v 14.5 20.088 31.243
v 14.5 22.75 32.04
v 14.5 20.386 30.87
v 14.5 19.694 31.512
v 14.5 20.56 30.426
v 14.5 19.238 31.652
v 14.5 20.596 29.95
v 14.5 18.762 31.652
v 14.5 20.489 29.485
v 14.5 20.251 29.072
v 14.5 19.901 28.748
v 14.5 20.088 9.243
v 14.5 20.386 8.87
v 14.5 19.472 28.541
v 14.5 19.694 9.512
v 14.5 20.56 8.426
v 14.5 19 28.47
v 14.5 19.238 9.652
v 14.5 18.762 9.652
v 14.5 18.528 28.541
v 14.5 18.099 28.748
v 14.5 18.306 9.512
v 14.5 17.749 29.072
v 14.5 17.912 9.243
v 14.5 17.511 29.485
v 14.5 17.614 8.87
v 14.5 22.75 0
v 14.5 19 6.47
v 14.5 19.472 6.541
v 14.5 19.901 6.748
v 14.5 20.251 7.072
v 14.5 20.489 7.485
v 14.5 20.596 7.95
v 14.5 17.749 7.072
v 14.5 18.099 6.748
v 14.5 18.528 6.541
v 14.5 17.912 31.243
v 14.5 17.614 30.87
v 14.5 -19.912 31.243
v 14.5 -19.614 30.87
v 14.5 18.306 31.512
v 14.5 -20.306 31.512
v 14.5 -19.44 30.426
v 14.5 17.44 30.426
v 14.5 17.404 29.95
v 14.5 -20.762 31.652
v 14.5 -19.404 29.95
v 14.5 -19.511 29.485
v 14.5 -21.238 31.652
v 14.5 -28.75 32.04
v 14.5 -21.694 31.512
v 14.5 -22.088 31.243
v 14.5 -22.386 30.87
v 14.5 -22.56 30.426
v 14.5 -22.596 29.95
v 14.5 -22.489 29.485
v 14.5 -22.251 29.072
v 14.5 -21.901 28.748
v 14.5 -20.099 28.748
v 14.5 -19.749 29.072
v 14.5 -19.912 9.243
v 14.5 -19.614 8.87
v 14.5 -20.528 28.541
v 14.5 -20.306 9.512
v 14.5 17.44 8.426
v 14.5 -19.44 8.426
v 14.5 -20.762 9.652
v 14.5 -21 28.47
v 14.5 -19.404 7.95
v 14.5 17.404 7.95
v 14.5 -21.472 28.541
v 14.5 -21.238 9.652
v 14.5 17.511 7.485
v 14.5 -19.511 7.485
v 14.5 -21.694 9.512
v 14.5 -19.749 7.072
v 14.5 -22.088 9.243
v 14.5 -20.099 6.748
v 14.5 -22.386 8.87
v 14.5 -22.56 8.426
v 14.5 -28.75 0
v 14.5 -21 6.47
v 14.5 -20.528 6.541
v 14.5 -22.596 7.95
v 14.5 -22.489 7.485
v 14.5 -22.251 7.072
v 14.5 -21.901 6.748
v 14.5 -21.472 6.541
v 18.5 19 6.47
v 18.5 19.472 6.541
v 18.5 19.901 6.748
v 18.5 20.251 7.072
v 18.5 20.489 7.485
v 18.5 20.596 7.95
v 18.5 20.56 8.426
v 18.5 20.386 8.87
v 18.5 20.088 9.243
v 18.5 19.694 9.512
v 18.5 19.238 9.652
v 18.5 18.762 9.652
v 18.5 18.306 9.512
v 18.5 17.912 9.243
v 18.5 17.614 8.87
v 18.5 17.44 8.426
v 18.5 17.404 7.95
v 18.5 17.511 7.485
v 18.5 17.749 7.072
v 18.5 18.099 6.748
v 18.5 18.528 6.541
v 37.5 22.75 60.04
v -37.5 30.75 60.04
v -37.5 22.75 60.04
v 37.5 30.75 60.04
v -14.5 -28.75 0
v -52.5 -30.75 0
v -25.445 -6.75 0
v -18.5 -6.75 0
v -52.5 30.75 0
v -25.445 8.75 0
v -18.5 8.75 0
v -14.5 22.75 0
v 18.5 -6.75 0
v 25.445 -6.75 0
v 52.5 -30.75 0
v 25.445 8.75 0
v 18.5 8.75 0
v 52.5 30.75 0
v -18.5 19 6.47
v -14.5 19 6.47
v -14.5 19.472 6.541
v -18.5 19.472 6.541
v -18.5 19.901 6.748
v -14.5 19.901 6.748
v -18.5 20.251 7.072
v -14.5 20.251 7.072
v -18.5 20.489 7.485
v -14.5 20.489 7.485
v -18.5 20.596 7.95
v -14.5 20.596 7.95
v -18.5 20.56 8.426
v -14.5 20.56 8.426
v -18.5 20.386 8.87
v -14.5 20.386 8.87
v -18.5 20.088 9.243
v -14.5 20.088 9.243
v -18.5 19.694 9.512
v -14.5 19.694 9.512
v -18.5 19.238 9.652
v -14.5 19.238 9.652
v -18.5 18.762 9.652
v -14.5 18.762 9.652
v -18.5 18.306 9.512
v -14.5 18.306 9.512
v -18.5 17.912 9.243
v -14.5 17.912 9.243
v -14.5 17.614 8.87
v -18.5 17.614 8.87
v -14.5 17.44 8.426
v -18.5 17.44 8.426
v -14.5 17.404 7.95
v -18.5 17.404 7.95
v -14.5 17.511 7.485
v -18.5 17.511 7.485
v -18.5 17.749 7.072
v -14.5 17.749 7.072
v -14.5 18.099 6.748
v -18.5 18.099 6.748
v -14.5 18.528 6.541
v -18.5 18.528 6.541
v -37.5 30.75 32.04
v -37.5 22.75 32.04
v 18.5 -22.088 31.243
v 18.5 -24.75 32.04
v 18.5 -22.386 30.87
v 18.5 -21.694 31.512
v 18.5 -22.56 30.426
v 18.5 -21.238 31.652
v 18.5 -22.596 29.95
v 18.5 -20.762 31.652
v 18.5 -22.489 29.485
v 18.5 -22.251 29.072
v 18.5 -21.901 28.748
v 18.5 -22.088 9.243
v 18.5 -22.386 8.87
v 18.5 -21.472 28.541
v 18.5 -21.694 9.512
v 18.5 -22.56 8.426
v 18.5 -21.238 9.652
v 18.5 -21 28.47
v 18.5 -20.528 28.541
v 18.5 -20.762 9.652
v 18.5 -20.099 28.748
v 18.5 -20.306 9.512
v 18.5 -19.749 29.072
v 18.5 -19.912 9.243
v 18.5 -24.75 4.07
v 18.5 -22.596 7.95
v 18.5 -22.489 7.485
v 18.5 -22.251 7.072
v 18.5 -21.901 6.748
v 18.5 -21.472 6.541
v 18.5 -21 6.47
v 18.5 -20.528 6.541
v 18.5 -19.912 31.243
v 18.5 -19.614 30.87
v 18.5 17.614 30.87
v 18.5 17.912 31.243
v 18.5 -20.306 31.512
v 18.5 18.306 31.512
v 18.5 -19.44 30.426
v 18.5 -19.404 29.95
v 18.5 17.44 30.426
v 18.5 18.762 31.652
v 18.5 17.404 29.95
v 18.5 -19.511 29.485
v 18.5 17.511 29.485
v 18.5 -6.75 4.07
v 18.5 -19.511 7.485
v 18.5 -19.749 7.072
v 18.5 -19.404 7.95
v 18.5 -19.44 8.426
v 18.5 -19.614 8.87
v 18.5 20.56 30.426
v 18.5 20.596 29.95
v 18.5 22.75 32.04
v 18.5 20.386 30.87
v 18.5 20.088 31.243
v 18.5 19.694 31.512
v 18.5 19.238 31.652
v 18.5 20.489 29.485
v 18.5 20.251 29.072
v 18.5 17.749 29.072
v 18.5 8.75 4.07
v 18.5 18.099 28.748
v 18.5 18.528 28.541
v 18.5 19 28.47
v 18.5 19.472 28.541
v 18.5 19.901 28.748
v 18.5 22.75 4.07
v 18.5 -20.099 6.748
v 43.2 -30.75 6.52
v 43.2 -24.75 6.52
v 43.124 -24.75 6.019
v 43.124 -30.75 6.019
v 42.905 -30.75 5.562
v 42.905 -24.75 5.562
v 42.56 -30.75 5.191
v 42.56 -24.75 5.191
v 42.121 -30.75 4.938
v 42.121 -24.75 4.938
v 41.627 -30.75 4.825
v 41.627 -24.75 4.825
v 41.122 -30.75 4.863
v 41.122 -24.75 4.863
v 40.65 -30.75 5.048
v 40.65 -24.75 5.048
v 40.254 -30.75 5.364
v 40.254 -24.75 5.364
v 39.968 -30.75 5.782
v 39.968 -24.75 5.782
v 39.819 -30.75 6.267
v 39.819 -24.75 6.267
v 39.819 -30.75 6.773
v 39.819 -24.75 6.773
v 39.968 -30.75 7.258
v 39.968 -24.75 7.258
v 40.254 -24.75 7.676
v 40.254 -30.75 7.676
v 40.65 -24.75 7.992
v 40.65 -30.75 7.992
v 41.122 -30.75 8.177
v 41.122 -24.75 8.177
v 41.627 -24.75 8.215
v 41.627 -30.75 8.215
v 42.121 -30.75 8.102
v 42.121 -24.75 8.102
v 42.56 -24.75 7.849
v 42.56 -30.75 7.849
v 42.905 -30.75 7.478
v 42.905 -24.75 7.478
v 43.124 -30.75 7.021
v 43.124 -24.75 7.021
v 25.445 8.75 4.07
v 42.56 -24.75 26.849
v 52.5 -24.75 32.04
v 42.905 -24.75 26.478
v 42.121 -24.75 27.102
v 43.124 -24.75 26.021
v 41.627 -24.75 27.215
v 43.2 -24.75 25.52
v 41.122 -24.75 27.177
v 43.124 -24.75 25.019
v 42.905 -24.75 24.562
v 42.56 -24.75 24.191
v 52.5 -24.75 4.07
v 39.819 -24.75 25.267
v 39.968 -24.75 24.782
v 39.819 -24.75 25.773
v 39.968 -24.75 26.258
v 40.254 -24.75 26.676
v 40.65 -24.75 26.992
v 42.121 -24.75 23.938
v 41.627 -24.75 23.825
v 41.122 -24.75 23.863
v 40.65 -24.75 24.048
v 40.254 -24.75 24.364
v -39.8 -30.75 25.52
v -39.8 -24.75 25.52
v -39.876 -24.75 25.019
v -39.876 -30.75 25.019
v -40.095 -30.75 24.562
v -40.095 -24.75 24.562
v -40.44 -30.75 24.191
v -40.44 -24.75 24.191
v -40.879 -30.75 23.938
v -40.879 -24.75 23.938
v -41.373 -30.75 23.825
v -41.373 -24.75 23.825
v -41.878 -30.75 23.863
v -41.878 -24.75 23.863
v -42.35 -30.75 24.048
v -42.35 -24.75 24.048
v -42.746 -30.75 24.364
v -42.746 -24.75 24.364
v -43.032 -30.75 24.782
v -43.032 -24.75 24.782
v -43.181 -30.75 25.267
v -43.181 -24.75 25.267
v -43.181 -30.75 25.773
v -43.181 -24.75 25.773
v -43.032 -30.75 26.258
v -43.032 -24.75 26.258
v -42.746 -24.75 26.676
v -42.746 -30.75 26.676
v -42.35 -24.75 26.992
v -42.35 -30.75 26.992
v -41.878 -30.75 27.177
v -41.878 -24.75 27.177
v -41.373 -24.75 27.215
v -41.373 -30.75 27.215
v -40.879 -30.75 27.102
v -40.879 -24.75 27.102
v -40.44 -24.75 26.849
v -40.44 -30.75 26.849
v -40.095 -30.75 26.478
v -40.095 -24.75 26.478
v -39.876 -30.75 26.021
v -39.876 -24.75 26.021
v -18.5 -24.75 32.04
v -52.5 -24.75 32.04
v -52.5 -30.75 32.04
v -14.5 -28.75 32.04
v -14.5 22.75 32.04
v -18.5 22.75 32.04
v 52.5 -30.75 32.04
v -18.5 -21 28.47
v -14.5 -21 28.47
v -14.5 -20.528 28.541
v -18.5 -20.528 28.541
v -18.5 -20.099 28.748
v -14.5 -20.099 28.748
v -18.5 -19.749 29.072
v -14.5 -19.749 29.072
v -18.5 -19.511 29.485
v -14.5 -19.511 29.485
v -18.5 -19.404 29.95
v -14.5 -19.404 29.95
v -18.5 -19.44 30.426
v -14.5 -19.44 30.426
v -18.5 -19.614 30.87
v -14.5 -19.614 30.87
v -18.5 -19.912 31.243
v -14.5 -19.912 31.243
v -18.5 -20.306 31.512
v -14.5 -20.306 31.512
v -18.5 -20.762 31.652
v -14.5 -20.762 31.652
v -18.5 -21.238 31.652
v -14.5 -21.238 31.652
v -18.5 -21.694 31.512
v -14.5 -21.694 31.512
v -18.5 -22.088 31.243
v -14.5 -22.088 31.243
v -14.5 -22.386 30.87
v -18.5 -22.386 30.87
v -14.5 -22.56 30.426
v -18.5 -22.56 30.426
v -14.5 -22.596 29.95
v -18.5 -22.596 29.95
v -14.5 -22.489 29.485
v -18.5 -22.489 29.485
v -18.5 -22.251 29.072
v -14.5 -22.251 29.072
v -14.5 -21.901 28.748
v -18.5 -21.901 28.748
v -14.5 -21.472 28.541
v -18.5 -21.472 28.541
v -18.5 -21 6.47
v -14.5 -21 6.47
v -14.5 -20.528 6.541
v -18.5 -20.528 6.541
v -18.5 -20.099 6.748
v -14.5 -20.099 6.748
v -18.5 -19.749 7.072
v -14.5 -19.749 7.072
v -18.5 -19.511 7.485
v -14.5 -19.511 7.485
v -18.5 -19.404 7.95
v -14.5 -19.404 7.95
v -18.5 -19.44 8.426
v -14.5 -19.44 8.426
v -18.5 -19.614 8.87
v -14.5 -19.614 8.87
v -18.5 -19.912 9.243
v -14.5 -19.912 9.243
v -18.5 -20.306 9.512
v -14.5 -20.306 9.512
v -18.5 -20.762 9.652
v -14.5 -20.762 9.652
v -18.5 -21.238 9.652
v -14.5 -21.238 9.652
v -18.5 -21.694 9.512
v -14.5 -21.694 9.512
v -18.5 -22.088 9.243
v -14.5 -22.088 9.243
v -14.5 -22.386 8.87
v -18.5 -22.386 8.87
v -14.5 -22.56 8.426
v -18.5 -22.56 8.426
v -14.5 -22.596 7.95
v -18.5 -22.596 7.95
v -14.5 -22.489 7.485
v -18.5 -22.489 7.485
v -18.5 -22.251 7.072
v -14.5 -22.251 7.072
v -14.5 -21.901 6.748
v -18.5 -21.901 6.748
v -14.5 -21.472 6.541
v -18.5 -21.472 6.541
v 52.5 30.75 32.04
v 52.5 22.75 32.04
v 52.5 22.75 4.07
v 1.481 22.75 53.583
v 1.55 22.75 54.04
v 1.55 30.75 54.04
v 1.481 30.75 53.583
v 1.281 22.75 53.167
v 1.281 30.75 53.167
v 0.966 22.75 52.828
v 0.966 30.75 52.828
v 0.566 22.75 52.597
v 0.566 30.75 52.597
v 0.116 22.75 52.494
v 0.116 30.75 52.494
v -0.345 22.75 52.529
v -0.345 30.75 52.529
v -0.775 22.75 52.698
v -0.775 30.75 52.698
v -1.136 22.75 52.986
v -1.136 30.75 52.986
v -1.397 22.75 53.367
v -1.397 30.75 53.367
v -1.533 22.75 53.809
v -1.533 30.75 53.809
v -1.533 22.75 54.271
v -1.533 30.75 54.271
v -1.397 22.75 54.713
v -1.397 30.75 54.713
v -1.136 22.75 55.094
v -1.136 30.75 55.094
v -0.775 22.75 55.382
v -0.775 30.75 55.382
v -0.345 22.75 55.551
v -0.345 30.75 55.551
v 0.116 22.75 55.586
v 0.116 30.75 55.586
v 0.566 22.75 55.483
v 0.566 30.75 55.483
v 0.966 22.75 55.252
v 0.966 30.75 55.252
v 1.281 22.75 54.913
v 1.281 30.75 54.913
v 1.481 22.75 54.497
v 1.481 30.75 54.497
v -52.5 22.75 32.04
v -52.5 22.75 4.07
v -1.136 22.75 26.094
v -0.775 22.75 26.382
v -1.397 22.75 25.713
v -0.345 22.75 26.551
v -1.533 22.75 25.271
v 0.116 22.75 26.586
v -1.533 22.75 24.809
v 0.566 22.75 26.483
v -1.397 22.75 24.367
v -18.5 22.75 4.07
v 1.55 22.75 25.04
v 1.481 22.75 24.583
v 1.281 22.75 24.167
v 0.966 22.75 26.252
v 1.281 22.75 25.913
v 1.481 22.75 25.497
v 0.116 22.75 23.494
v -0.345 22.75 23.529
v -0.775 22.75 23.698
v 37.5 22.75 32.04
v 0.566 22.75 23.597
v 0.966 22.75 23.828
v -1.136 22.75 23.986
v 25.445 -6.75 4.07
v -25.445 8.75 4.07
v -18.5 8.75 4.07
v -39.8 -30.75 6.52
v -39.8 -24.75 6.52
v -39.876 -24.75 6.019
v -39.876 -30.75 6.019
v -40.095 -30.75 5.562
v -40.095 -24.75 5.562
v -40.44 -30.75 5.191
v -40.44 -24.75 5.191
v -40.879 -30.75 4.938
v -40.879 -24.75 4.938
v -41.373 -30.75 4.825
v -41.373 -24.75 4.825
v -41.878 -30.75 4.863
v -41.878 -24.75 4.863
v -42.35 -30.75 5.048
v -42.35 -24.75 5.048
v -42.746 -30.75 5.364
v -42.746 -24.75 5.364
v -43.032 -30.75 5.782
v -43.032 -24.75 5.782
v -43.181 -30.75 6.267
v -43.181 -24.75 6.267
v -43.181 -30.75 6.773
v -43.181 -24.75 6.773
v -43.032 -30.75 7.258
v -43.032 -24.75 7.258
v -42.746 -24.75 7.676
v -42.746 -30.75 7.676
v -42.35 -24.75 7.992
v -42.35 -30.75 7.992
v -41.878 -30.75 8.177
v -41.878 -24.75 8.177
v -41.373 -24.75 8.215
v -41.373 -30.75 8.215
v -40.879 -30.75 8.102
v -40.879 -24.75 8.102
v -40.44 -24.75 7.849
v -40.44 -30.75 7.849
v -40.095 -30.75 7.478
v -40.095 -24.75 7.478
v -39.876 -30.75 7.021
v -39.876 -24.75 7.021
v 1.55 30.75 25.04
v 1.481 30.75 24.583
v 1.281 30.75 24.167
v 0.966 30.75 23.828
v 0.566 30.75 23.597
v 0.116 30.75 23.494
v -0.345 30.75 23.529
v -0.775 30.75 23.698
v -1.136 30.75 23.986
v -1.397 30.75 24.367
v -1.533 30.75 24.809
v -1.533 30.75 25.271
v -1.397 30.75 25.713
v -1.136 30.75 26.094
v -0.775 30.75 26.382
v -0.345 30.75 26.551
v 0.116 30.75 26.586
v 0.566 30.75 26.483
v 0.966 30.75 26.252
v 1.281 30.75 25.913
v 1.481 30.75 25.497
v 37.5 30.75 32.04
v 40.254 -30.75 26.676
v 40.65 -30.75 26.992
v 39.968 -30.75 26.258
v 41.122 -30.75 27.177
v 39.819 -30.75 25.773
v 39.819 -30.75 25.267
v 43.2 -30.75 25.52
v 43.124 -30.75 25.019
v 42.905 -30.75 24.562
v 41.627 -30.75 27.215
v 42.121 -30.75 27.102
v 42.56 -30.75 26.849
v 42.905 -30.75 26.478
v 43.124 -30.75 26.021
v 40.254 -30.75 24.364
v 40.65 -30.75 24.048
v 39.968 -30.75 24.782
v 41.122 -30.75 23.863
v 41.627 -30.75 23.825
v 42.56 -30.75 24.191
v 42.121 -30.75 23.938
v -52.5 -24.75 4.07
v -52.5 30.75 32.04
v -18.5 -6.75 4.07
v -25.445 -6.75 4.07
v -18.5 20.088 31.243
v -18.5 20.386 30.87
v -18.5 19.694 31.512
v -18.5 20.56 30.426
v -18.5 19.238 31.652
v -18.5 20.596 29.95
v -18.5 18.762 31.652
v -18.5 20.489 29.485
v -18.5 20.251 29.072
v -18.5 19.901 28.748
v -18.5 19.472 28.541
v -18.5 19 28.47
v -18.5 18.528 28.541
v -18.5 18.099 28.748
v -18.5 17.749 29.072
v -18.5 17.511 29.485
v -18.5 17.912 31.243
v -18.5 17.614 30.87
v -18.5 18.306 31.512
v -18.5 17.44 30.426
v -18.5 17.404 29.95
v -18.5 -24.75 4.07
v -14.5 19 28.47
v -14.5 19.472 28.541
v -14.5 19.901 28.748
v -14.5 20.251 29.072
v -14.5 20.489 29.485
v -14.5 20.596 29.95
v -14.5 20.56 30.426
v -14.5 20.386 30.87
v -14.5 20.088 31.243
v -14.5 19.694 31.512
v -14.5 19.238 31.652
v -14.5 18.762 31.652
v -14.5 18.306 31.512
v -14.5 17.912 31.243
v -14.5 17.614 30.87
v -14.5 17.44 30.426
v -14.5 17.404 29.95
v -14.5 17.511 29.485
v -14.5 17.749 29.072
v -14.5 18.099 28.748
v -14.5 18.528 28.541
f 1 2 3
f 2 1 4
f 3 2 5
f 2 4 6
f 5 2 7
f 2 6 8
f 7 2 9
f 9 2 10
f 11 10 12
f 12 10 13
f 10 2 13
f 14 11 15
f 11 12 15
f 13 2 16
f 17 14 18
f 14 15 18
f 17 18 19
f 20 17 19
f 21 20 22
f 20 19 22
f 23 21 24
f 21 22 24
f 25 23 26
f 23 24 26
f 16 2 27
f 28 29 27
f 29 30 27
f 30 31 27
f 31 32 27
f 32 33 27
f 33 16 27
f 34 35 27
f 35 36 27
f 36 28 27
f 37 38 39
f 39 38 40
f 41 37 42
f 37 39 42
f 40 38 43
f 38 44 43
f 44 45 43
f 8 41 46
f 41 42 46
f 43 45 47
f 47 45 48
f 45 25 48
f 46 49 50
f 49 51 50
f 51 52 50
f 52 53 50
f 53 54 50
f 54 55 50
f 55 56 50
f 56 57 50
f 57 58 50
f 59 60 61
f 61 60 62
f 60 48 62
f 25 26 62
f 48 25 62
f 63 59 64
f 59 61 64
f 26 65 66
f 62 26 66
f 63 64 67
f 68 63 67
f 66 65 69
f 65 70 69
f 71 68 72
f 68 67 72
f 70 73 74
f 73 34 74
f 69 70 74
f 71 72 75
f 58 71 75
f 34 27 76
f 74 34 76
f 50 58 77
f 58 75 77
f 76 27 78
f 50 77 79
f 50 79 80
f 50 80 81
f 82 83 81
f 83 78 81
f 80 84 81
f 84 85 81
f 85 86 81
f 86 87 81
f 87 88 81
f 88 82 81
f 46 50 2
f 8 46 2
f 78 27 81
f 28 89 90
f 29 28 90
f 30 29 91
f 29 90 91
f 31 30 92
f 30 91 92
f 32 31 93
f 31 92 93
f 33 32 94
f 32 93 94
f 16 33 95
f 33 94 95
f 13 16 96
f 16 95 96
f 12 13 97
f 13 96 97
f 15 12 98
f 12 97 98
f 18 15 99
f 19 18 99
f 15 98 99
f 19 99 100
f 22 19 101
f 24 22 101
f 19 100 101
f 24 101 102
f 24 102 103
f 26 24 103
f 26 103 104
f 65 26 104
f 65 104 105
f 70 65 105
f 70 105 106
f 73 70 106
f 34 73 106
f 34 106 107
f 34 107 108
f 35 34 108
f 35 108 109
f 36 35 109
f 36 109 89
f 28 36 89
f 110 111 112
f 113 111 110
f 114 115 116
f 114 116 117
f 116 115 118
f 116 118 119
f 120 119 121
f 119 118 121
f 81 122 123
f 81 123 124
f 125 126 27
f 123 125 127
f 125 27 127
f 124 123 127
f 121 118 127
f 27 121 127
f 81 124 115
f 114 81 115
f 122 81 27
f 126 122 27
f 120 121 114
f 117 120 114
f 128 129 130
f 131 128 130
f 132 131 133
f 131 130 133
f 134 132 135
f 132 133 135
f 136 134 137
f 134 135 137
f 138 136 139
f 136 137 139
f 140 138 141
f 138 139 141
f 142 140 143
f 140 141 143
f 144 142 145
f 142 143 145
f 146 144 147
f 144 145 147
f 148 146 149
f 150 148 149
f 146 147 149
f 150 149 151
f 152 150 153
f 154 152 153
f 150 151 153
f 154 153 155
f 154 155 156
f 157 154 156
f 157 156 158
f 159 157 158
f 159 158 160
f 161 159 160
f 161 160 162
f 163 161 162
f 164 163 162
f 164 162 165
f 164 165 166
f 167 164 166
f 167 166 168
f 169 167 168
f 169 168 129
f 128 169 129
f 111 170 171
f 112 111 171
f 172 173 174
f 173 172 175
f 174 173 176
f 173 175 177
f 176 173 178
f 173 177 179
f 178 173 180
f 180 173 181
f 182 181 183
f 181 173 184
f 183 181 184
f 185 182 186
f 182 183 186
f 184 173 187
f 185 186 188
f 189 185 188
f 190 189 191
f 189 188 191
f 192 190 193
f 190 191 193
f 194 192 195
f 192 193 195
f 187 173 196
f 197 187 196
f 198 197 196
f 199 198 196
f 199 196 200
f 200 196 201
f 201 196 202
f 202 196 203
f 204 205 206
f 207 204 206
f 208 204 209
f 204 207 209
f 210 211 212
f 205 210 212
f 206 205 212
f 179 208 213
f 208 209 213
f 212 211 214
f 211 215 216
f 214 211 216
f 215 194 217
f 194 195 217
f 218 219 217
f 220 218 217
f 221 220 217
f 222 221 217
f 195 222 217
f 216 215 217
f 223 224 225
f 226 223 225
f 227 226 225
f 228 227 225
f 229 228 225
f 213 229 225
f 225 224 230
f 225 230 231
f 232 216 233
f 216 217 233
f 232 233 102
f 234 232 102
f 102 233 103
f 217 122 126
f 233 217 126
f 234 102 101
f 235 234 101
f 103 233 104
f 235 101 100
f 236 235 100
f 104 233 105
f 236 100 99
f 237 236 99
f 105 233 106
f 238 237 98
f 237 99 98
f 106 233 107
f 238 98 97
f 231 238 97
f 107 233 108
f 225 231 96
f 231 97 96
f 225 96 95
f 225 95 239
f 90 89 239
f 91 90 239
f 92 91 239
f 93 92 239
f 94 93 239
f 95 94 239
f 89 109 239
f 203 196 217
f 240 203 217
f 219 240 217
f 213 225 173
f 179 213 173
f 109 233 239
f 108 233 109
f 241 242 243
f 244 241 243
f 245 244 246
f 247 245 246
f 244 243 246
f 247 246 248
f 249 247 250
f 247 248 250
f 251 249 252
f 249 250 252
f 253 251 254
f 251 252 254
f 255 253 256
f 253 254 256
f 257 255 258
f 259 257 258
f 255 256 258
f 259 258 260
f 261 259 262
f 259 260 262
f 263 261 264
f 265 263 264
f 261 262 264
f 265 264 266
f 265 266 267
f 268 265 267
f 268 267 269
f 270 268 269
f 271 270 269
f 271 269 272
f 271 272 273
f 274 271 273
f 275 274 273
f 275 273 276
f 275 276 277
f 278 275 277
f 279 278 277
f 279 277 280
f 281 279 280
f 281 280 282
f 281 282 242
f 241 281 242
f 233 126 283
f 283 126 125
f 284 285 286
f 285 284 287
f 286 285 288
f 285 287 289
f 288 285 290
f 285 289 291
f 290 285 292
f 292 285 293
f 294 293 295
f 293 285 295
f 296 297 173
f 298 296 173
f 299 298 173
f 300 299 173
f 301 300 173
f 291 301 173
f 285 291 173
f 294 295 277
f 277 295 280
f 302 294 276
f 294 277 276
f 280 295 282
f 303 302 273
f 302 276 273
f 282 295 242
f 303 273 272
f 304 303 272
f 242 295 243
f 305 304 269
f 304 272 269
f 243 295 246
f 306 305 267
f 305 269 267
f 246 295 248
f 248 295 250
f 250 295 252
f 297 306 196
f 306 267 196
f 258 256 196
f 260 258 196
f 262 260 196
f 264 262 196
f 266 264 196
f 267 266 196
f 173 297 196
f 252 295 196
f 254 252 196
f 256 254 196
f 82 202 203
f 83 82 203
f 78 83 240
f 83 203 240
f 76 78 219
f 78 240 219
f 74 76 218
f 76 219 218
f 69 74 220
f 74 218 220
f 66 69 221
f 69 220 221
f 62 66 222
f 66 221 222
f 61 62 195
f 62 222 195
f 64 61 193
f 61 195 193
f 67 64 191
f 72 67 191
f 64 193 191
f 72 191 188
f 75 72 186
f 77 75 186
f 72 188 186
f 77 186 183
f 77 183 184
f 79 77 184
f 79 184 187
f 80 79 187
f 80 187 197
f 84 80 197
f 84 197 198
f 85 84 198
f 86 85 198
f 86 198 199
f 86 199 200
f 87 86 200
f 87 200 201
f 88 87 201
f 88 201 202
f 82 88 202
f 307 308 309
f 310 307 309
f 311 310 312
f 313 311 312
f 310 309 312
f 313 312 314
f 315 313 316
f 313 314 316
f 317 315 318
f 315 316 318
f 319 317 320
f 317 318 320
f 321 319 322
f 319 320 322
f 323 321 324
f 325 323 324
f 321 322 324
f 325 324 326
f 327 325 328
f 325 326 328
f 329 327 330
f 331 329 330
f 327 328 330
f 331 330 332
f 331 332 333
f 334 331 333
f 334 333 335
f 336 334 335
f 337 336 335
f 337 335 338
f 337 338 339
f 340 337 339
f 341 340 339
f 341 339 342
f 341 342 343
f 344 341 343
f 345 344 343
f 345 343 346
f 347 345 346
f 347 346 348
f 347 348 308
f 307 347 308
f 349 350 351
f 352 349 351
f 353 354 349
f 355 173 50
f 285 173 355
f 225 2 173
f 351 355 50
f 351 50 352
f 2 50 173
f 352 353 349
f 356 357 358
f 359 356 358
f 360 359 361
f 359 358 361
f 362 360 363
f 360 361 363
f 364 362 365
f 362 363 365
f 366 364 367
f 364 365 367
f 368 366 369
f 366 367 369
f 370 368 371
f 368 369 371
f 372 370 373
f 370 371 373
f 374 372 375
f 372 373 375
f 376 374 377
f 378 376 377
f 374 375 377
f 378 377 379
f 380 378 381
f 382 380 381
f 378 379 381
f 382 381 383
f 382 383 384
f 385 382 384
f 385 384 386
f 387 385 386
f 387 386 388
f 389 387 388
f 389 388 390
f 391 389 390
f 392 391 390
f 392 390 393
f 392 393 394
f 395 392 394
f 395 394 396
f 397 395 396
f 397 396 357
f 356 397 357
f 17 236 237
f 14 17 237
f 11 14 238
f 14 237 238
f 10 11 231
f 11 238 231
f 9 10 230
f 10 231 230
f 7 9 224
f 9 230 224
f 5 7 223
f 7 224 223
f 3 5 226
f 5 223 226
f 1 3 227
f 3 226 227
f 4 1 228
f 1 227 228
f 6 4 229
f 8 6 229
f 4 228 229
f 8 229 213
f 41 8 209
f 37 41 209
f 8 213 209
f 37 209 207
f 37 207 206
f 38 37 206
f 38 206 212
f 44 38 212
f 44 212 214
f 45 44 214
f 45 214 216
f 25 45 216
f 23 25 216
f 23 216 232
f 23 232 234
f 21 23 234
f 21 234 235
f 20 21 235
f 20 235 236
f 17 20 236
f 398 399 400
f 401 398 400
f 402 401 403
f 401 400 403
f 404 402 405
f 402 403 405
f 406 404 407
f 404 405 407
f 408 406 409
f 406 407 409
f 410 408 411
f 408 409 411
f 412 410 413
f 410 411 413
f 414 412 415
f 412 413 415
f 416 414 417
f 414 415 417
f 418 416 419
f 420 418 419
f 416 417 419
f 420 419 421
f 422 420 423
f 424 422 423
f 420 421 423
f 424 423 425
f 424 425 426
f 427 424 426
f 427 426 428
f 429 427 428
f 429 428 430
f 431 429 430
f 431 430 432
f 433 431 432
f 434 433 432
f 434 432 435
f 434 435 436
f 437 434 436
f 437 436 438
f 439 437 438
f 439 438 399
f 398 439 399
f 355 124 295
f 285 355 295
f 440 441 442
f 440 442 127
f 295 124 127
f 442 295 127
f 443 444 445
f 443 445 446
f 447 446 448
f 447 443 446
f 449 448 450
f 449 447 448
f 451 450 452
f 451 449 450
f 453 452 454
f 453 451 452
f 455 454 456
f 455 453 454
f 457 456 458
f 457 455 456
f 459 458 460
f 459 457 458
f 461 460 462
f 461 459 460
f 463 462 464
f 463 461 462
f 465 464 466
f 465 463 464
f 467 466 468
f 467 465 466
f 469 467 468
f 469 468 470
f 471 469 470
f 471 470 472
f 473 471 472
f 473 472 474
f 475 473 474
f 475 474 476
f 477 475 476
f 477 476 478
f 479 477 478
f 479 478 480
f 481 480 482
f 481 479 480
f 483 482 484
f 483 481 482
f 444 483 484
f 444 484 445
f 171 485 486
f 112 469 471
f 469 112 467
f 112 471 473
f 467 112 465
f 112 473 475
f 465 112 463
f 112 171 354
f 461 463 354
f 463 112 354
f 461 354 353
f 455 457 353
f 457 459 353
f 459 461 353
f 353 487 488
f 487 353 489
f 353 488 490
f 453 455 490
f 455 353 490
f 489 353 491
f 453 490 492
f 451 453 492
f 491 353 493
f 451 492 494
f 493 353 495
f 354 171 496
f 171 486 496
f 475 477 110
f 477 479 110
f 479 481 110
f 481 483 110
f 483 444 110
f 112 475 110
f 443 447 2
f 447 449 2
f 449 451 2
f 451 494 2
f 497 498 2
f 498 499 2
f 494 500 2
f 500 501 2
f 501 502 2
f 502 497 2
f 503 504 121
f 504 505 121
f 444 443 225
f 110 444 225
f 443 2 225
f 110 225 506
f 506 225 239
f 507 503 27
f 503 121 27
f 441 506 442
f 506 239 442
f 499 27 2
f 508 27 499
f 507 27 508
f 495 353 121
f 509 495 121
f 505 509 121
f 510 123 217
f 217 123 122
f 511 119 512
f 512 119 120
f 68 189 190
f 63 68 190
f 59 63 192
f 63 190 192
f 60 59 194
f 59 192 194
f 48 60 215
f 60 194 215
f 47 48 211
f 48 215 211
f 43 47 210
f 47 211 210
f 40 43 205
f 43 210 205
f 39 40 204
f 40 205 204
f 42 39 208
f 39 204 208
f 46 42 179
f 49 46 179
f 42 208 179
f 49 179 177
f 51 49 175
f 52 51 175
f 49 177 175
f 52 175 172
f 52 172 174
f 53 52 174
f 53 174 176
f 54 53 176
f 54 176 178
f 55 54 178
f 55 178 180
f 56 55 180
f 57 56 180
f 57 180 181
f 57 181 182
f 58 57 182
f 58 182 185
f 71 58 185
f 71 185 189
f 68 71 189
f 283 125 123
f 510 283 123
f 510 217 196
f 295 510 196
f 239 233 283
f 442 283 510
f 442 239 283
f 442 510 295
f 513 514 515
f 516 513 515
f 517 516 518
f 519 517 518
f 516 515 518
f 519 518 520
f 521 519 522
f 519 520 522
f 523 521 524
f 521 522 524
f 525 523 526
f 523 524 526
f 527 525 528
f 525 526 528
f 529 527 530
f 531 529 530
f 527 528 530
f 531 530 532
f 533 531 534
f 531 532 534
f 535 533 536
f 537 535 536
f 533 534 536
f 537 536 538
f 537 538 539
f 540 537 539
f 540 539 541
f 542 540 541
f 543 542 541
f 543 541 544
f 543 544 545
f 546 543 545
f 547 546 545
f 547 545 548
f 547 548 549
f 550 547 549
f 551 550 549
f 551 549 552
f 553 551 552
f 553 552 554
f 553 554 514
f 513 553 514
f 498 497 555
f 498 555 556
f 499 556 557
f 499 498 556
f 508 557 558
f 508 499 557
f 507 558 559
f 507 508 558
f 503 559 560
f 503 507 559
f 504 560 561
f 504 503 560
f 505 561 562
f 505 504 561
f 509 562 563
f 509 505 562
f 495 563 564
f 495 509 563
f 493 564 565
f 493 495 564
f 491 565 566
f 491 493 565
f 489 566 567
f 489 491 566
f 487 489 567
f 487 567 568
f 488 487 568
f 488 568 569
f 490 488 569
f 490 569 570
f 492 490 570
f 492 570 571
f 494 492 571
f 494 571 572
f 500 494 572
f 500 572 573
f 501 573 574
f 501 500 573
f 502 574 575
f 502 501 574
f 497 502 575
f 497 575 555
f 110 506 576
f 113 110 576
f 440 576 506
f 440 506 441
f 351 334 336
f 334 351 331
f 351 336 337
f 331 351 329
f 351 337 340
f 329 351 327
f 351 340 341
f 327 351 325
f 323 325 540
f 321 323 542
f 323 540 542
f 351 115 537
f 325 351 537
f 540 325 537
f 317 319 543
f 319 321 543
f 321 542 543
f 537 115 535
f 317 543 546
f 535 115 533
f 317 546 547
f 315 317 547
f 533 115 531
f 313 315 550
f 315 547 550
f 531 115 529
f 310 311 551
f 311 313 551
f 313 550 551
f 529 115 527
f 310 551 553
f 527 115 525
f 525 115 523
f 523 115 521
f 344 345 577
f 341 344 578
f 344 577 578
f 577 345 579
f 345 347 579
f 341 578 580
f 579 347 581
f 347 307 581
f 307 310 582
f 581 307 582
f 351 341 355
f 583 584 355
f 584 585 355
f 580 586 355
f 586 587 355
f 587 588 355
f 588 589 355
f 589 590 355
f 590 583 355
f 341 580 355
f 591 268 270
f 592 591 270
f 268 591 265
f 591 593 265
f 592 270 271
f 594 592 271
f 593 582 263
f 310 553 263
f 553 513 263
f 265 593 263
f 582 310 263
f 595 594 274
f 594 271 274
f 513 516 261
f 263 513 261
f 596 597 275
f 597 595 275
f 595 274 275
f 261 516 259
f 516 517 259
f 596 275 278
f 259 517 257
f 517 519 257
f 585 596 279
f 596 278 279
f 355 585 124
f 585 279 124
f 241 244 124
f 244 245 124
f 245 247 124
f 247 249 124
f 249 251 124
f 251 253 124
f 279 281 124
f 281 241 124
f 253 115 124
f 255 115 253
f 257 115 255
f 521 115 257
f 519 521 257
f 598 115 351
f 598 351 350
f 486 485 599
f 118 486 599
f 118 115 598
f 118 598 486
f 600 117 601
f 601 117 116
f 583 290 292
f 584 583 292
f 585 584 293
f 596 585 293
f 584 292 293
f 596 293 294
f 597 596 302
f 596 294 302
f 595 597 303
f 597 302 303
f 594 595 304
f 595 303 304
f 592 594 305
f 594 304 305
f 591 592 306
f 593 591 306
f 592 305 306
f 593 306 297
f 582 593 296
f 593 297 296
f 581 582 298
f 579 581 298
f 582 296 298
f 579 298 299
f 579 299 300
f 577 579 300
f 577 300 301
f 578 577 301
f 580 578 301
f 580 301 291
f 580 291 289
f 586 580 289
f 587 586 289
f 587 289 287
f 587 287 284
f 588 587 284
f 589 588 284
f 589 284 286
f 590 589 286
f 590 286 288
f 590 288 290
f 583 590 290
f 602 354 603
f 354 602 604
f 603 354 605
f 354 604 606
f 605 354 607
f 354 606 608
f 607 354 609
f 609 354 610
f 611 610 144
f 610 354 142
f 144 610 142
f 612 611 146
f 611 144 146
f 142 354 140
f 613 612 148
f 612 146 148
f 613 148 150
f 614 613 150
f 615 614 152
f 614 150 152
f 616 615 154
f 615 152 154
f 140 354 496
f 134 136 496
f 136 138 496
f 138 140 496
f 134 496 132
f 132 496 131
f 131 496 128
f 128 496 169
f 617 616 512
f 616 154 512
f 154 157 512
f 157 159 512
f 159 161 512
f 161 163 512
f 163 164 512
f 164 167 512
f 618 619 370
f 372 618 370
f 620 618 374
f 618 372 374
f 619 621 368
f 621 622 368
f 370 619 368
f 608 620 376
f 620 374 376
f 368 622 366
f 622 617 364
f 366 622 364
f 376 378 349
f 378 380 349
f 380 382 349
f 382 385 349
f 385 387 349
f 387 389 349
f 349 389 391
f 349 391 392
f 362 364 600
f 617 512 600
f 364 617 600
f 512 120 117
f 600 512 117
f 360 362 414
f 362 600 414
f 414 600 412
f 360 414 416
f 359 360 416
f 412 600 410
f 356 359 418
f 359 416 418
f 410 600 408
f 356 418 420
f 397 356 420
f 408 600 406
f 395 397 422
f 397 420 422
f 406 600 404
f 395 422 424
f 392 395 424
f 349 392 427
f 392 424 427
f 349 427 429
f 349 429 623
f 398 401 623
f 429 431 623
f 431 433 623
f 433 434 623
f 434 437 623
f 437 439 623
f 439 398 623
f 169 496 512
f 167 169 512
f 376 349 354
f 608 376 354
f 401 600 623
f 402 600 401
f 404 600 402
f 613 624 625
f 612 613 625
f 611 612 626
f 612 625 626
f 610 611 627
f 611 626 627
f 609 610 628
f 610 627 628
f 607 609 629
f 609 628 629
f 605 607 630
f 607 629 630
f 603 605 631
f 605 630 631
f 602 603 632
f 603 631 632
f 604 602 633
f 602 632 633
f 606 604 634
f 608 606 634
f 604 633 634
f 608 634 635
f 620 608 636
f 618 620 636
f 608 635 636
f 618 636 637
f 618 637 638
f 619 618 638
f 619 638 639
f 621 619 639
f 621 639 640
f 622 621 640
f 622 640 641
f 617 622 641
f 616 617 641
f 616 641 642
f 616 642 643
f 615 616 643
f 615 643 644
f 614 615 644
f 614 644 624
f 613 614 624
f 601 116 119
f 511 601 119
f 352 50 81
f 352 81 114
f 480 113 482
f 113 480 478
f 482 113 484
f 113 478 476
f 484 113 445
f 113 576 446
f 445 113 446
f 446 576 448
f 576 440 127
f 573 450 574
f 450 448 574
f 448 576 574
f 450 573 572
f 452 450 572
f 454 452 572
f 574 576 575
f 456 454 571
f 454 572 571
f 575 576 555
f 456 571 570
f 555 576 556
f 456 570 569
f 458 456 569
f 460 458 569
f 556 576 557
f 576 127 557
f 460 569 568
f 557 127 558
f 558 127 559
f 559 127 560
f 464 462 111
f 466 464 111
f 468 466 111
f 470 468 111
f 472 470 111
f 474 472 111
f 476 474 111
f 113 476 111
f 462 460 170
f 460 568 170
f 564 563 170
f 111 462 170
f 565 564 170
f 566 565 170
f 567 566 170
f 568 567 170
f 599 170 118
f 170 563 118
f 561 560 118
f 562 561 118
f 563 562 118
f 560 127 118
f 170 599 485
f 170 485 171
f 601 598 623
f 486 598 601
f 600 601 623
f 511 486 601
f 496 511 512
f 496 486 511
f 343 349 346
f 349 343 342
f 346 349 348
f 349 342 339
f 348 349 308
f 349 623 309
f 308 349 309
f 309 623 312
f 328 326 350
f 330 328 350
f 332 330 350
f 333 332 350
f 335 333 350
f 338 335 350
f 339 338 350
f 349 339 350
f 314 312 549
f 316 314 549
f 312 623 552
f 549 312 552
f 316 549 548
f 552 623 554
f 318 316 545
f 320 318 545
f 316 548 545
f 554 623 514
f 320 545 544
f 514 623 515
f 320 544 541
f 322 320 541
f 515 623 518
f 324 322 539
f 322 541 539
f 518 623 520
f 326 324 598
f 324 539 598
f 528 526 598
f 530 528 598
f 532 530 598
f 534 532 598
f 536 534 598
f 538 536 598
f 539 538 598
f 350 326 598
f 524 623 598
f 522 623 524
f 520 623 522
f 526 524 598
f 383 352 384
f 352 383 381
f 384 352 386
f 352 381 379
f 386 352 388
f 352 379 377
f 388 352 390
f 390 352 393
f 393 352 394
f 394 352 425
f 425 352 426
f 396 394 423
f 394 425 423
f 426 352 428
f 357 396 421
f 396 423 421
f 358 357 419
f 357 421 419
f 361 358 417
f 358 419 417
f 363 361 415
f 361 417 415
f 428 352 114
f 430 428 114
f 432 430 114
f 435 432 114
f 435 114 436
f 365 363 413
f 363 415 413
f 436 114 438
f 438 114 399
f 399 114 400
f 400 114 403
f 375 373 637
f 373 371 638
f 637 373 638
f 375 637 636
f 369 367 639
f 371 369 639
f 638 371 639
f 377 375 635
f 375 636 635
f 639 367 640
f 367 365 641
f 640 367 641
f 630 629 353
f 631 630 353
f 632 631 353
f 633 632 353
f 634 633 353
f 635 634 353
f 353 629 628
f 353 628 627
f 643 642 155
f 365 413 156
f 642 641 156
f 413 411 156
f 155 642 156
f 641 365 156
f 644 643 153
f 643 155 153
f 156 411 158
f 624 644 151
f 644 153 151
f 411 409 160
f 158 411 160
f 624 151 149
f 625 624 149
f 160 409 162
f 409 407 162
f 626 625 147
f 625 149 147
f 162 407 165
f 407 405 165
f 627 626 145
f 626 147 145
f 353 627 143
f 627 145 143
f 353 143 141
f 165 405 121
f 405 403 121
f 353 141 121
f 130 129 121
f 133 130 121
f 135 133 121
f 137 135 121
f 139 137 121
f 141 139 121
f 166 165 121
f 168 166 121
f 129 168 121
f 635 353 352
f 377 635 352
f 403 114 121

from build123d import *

# Parameters (mm, degrees)
BOSS_EXTRU_1_DEPTH         = 4.07
BOSS_EXTRU_1_2_DEPTH       = 4.07
ESQUISSE1_3_W              = 15
ESQUISSE1_3_H              = 8
BOSS_EXTRU_2_DEPTH         = 32.04
BOSS_EXTRU_3_DEPTH         = 60.04
D_GAGEMENT_M31_D           = 3.2
D_GAGEMENT_M32_D           = 3.4
D_GAGEMENT_M32_DEPTH       = 6
D_GAGEMENT_START           = 22.75
D_GAGEMENT_M2_51_OUTLINE_R = 1.55
D_GAGEMENT_M2_51_DEPTH     = 8


# Read off the part's stored shape, not the designer's step: Dégagement M2.51
with BuildPart() as part:
    # Esquisse1 → Boss.-Extru.1 (new body)
    with BuildSketch(Plane.XY):
        Polygon((-52.5, -24.75), (-18.5, -24.75), (-18.5, -6.75), (-25.445395167, -6.75), (-25.445395167, 8.75), (-18.5, 8.75), (-18.5, 22.75), (-52.5, 22.75), align=None)
    extrude(amount=BOSS_EXTRU_1_DEPTH)



with BuildPart() as body_2:
    # Esquisse1 → Boss.-Extru.1 2 (new body)
    with BuildSketch(Plane.XY):
        Polygon((18.5, -24.75), (52.5, -24.75), (52.5, 22.75), (37.5, 22.75), (18.5, 22.75), (18.5, 8.75), (25.445395167, 8.75), (25.445395167, -6.75), (18.5, -6.75), align=None)
    extrude(amount=BOSS_EXTRU_1_2_DEPTH)


with BuildPart() as part_1:
    add(part.part)

    add(body_2.part)  # Boss.-Extru.2 merges body 2
    # Esquisse1<3> → Boss.-Extru.2 (add)
    with BuildSketch(Plane.XY):
        with Locations((-45, 26.75)):
            Rectangle(ESQUISSE1_3_W, ESQUISSE1_3_H)
        Polygon((-18.5, 8.75), (-18.5, -6.75), (-18.5, -24.75), (-52.5, -24.75), (-52.5, -30.75), (52.5, -30.75), (52.5, -24.75), (18.5, -24.75), (18.5, -6.75), (18.5, 8.75), (18.5, 22.75), (14.5, 22.75), (14.5, -28.75), (-14.5, -28.75), (-14.5, 22.75), (-18.5, 22.75), align=None)
        with Locations((45, 26.75)):
            Rectangle(ESQUISSE1_3_W, ESQUISSE1_3_H)
    extrude(amount=BOSS_EXTRU_2_DEPTH)

    # Esquisse1<4> → Boss.-Extru.3 (add)
    with BuildSketch(Plane.XY):
        Polygon((-37.5, 22.75), (-18.5, 22.75), (-14.5, 22.75), (14.5, 22.75), (18.5, 22.75), (37.5, 22.75), (37.5, 30.75), (-37.5, 30.75), align=None)
    extrude(amount=BOSS_EXTRU_3_DEPTH)

    # Dégagement M31 (through all)
    with Locations(Plane.ZY.offset(18.5)):
        with Locations((8.07, -21), (8.07, 19), (30.07, 19), (30.07, -21)):
            Hole(D_GAGEMENT_M31_D / 2)

    # Dégagement M32
    with Locations(Plane(origin=(0, -30.75, 0), x_dir=(-1, 0, 0), z_dir=(0, -1, 0))):
        with Locations((-41.5, -25.52), (-41.5, -6.52), (41.5, -6.52), (41.5, -25.52)):
            Hole(D_GAGEMENT_M32_D / 2, depth=D_GAGEMENT_M32_DEPTH)

    # Dégagement M2.51 outline → Dégagement M2.51 (cut)
    with BuildSketch(Plane(origin=(0, 0, 0), x_dir=(1, 0, 0), z_dir=(0, 1, 0)).offset(D_GAGEMENT_START)):
        with Locations((0, -54.04)):
            Circle(D_GAGEMENT_M2_51_OUTLINE_R)
        with Locations((0, -25.04)):
            Circle(D_GAGEMENT_M2_51_OUTLINE_R)
    extrude(amount=D_GAGEMENT_M2_51_DEPTH, mode=Mode.SUBTRACT)


solid = part_1.part
